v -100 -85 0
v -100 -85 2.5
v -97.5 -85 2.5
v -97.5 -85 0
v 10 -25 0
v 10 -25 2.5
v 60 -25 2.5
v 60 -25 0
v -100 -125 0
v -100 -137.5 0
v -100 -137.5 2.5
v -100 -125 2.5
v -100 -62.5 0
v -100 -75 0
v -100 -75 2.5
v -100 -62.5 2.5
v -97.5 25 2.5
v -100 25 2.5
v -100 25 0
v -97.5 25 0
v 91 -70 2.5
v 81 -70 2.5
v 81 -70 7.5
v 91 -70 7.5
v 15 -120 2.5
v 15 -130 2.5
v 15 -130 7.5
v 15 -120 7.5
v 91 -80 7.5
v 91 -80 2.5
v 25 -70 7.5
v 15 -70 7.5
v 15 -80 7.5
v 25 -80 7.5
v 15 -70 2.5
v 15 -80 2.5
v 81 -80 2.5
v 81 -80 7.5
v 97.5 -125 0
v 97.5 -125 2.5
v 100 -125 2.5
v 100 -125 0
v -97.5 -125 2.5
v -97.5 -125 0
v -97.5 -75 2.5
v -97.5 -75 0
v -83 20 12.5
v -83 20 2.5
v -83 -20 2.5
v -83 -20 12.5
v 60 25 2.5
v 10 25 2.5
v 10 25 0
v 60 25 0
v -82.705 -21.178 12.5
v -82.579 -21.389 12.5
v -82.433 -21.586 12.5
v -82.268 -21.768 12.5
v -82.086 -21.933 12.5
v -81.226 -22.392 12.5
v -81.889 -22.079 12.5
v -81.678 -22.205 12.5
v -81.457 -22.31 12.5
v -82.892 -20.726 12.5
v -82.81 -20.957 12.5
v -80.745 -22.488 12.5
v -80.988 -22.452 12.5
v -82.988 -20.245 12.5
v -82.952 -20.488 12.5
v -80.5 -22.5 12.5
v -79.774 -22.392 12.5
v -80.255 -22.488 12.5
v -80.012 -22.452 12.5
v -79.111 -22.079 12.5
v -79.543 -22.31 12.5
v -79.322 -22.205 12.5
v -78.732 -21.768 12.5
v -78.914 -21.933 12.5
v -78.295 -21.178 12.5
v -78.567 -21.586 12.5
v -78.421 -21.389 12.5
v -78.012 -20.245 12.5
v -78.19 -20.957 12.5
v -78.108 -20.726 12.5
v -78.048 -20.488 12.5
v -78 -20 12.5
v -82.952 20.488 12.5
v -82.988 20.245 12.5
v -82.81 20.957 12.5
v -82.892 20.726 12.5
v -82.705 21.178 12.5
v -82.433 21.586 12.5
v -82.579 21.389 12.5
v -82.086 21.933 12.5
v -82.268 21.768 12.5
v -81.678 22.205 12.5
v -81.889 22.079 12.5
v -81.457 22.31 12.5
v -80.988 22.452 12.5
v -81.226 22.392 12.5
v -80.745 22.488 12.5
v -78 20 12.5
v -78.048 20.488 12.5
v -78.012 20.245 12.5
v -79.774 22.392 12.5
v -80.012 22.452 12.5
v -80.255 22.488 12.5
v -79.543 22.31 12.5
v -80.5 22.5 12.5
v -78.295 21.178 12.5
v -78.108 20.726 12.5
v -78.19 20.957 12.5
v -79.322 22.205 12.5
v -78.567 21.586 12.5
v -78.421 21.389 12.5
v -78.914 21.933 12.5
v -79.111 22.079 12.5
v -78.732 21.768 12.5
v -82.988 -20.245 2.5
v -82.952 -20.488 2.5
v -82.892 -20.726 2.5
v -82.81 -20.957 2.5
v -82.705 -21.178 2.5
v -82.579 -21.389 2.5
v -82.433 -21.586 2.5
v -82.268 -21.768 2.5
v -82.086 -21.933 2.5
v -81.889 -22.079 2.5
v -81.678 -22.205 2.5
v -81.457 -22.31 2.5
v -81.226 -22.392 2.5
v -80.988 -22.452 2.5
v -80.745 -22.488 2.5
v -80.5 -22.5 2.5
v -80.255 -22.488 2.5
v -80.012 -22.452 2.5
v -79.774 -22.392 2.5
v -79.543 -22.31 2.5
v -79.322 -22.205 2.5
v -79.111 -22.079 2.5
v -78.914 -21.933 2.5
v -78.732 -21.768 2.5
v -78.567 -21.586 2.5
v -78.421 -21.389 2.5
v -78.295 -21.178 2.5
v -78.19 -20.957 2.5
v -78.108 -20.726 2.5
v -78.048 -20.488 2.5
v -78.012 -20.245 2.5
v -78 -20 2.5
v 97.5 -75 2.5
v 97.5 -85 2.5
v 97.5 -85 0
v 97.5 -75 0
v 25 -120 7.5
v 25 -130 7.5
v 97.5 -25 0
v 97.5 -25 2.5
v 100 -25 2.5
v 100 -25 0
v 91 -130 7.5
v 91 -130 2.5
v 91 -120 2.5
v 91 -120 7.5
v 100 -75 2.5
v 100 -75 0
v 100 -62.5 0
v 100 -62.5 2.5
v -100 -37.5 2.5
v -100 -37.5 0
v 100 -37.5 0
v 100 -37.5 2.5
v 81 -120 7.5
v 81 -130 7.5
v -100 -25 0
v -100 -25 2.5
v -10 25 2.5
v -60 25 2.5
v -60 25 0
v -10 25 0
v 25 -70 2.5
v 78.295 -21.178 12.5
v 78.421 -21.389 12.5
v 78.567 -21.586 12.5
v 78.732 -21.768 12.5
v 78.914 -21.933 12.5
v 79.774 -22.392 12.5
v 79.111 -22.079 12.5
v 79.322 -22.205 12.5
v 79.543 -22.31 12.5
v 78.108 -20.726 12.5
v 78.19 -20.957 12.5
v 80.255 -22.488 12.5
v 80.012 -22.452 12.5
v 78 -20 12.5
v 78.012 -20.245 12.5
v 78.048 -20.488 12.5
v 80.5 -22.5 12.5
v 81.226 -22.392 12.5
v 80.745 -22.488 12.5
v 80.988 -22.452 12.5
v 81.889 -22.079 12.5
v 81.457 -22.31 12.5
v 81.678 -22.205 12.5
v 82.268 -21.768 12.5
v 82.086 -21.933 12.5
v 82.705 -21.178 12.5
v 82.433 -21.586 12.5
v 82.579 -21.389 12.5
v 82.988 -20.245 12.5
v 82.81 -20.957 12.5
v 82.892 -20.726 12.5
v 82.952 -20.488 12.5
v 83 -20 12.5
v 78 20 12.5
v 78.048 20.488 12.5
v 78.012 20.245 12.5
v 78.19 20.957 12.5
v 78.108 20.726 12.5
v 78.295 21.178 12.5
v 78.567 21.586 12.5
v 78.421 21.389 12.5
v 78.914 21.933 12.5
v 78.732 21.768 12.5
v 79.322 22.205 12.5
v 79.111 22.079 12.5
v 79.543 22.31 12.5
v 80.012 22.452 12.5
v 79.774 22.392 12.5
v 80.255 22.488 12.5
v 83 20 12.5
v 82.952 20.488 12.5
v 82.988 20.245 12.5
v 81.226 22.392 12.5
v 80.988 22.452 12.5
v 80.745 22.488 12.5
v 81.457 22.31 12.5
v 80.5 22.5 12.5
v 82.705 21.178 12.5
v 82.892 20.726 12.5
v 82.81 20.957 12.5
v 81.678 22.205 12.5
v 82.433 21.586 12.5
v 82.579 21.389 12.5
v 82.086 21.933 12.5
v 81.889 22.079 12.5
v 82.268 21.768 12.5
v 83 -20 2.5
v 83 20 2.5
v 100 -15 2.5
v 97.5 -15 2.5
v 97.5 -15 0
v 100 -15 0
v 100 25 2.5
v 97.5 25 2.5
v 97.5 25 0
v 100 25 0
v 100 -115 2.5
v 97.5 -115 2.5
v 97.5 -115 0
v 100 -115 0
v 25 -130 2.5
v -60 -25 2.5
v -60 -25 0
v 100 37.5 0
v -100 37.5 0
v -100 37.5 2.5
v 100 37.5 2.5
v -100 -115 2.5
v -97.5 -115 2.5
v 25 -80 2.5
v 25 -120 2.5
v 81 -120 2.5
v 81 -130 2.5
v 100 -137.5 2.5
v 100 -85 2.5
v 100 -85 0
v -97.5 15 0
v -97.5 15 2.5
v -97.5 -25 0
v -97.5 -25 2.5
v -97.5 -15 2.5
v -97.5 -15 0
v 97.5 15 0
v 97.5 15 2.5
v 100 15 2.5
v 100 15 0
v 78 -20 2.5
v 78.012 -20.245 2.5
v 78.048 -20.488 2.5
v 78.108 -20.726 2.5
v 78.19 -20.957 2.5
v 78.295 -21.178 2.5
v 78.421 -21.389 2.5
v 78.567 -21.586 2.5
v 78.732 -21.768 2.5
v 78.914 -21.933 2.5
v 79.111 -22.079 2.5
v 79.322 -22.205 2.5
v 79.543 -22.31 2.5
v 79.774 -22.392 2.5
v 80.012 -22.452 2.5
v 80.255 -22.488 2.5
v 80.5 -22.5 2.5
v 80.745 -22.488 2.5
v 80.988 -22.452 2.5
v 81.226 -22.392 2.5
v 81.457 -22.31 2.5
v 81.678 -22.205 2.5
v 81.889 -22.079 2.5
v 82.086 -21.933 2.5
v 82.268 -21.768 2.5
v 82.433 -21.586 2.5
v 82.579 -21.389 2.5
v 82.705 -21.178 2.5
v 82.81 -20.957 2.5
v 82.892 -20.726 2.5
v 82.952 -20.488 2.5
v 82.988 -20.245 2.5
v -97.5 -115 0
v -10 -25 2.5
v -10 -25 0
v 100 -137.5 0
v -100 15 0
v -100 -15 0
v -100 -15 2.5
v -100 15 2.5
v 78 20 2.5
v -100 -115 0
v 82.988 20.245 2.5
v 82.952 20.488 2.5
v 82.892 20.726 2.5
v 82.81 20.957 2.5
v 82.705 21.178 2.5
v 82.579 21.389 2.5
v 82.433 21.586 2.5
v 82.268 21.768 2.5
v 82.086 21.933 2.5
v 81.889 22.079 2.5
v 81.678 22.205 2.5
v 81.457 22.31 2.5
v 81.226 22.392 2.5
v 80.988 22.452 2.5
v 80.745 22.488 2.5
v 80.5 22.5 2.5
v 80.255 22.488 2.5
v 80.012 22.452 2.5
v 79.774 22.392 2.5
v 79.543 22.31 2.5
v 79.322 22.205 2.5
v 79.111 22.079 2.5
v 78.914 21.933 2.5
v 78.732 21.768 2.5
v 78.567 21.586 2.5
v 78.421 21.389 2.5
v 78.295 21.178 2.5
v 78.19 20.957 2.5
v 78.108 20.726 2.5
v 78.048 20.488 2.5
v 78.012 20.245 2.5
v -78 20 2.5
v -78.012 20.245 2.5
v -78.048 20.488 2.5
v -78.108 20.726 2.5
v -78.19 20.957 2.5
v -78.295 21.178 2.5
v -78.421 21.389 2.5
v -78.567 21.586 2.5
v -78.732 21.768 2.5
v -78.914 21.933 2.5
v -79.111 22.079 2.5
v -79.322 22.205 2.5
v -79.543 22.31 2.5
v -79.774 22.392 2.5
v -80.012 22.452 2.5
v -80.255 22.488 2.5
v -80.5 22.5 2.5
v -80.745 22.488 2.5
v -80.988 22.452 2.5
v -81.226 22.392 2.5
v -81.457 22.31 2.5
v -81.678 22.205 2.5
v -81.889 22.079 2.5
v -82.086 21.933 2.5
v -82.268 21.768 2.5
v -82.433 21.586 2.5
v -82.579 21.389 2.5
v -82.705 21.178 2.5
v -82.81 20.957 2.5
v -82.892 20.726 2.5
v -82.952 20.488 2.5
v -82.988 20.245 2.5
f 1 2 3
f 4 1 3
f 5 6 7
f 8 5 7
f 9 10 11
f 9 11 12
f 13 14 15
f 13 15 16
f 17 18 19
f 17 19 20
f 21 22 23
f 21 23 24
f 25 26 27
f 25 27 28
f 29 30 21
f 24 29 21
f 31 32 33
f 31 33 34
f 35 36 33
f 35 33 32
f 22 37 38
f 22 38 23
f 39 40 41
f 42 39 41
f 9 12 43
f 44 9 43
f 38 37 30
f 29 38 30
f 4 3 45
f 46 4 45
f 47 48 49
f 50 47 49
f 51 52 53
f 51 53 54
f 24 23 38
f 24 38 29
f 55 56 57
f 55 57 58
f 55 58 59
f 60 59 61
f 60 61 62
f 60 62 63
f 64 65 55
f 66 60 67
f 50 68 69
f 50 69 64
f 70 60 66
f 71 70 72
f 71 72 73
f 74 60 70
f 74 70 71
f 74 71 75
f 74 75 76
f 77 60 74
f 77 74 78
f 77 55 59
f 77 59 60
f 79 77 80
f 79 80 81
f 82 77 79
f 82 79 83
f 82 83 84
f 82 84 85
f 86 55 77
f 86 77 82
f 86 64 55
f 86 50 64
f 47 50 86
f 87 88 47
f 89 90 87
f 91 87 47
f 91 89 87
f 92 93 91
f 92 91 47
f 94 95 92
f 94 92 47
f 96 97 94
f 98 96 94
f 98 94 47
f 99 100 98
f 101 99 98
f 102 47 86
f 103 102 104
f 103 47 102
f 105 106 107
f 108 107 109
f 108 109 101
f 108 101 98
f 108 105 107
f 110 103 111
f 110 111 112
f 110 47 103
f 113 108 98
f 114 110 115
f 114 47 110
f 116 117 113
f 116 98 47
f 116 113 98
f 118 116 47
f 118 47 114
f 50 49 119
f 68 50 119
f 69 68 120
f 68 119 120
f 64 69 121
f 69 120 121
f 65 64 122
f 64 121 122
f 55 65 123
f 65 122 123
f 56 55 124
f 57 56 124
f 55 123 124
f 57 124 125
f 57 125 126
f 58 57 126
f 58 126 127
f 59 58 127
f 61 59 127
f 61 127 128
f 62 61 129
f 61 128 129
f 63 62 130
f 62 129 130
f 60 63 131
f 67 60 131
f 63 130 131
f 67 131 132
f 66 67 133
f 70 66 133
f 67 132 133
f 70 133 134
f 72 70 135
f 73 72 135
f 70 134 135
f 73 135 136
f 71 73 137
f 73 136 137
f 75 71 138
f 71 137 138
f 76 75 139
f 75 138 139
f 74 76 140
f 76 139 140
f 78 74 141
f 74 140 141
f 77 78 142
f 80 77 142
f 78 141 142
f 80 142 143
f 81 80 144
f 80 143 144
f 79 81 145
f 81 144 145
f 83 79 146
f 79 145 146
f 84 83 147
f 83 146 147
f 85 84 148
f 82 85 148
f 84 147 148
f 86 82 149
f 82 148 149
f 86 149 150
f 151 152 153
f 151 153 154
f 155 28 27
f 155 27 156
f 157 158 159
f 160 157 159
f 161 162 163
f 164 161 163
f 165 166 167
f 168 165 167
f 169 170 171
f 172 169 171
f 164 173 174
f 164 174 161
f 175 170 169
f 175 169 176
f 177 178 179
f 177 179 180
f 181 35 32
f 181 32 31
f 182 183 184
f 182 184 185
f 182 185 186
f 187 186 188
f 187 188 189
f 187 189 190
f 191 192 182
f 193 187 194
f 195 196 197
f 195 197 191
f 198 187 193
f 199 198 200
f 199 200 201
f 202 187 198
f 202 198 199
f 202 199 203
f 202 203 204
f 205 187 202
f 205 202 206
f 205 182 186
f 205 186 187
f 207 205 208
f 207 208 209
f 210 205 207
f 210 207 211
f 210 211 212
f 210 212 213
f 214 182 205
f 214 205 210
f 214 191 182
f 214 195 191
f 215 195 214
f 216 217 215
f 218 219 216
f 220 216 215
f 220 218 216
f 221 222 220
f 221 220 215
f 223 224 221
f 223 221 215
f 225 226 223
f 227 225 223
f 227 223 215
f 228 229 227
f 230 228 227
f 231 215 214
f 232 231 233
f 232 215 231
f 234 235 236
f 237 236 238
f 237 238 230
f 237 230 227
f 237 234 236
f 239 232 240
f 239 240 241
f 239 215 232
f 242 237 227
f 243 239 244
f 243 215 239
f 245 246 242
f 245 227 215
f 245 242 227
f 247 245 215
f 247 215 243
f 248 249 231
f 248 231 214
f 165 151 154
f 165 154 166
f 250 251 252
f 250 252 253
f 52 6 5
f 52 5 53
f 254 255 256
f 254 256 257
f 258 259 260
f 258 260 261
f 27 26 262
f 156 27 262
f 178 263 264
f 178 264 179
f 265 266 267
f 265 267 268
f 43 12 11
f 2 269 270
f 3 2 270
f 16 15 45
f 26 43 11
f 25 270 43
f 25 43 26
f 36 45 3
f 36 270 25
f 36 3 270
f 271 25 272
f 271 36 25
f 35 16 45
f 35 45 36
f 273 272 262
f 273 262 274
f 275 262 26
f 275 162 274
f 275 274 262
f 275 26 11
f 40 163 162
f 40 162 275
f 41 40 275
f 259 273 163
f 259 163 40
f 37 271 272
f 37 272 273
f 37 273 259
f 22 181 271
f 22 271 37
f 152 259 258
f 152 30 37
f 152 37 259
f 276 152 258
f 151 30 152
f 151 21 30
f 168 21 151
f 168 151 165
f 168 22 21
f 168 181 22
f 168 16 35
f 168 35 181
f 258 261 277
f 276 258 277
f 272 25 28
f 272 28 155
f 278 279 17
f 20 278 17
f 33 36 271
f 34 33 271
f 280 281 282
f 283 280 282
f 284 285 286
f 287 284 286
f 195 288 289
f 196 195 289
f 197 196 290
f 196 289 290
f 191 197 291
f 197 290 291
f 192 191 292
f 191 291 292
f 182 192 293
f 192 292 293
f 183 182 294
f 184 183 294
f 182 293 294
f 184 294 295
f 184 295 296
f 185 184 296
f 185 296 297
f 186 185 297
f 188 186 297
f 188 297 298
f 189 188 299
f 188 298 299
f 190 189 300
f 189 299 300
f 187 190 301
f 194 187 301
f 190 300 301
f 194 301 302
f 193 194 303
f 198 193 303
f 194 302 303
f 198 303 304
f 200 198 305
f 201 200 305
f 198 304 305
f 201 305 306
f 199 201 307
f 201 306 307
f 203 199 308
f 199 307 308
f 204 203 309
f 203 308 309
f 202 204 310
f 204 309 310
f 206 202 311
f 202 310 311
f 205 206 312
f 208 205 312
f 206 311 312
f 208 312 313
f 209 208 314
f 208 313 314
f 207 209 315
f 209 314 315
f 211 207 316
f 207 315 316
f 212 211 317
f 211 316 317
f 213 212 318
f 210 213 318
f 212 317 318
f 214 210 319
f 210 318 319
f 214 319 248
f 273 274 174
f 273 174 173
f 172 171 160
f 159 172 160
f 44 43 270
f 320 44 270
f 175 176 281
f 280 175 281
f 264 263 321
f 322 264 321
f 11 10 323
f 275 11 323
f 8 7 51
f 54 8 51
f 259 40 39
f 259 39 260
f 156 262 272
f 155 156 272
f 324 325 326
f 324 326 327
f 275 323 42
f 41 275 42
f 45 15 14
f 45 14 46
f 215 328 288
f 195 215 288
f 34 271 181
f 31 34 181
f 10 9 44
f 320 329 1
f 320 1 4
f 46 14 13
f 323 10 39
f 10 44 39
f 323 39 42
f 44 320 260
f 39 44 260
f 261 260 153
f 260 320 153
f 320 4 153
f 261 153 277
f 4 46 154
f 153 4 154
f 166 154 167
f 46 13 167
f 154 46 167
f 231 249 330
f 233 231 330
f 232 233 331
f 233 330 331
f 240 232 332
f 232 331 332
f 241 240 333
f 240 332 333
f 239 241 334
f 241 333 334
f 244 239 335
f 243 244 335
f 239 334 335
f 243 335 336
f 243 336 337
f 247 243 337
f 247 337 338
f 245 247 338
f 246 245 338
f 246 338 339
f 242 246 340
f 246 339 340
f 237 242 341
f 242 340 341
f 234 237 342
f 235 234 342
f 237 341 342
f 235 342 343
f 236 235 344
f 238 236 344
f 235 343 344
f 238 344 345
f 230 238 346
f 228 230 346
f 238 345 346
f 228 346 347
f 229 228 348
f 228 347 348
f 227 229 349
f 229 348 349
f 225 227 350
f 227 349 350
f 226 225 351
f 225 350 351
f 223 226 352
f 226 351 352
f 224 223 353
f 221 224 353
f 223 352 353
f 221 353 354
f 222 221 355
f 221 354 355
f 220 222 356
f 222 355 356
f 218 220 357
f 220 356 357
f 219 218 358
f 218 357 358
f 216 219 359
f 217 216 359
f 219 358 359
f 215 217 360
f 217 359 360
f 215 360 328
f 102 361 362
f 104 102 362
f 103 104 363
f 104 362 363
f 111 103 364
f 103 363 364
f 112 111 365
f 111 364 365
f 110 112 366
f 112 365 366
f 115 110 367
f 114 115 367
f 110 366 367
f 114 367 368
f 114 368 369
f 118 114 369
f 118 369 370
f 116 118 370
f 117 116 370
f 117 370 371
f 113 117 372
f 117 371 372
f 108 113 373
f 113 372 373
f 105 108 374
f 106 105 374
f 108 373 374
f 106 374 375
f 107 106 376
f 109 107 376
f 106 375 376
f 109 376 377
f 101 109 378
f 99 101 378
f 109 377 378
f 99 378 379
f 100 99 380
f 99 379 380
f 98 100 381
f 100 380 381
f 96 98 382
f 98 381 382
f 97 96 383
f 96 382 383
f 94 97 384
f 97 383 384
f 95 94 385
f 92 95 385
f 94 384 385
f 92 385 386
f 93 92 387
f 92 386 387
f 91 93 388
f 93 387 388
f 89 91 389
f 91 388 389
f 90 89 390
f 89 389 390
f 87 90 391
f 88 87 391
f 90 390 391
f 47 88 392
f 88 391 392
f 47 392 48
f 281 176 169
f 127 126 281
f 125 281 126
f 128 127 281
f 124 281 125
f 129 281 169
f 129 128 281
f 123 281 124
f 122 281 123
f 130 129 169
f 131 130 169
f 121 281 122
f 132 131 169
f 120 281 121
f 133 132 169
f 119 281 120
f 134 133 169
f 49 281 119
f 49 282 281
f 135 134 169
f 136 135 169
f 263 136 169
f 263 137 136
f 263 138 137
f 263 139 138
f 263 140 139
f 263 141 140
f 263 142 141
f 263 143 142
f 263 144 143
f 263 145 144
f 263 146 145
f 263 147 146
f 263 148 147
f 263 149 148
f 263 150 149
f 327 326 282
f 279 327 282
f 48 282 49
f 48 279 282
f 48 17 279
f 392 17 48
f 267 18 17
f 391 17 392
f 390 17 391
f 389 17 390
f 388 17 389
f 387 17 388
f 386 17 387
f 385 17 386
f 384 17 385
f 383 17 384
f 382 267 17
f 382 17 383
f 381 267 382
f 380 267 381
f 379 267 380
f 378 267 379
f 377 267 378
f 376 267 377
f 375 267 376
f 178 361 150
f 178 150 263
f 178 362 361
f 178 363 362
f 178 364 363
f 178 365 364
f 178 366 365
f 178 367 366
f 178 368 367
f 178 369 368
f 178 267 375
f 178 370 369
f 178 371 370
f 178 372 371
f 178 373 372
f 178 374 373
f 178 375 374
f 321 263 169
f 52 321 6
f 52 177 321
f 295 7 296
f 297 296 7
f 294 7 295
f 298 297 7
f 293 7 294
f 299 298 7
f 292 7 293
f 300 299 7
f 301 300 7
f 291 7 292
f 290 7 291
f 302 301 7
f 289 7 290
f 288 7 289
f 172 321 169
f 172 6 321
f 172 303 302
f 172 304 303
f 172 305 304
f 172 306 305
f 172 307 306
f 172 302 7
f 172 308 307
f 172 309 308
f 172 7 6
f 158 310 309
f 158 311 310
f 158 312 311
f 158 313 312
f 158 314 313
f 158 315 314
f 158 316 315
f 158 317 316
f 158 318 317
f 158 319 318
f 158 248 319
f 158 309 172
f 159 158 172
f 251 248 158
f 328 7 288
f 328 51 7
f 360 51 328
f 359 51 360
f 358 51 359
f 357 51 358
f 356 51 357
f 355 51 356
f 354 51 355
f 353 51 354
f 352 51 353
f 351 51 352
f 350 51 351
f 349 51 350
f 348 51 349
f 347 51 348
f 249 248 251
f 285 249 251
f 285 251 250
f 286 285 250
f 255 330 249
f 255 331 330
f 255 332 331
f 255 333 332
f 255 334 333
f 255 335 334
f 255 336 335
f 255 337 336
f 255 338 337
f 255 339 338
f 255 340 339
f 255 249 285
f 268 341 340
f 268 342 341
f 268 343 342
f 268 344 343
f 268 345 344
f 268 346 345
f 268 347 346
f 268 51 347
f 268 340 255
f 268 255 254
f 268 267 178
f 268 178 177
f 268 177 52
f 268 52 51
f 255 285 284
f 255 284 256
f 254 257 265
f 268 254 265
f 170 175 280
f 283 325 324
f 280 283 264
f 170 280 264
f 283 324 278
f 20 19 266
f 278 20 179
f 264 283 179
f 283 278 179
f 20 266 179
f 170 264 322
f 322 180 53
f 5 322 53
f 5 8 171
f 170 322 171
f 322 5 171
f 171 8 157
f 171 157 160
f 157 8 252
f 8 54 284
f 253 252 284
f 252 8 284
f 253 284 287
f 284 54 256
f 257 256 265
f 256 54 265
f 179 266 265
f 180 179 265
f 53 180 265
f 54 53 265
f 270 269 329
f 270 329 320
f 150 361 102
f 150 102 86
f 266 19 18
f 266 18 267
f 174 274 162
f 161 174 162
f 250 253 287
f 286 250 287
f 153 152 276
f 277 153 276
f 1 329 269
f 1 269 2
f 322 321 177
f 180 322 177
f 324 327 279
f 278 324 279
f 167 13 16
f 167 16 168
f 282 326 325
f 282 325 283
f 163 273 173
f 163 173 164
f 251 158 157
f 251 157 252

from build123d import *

# Parameters (mm, degrees)
SKETCH_W        = 200
SKETCH_H        = 75
PAD_DEPTH       = 2.5
PAD001_DEPTH    = 10
SKETCH002_W     = 50
SKETCH002_H     = 50
SKETCH002_W_2   = 2.5
SKETCH002_H_2   = 10
POCKET_DEPTH    = 5
SKETCH003_W     = 200
SKETCH003_H     = 75
PAD002_DEPTH    = 2.5
SKETCH004_W     = 2.5
SKETCH004_H     = 10
POCKET001_DEPTH = 2.5
SKETCH005_W     = 10
SKETCH005_H     = 10
PAD003_DEPTH    = 5


with BuildPart() as base_inverted:
    # Sketch (on XY_Plane of Origin) → Pad (new body)
    with BuildSketch(Plane.XY):
        Rectangle(SKETCH_W, SKETCH_H)
    extrude(amount=PAD_DEPTH)

    # Sketch001 (on Face6 of Pad) → Pad001 (join)
    with BuildSketch(Plane.XY.offset(2.5)):
        with BuildLine():
            ThreePointArc((-78, 20), (-80.5, 22.5), (-83, 20))
            Line((-83, 20), (-83, -20))
            ThreePointArc((-83, -20), (-80.5, -22.5), (-78, -20))
            Line((-78, 20), (-78, -20))
        make_face()
        with BuildLine():
            ThreePointArc((83, 20), (80.5, 22.5), (78, 20))
            Line((78, 20), (78, -20))
            ThreePointArc((78, -20), (80.5, -22.5), (83, -20))
            Line((83, 20), (83, -20))
        make_face()
    extrude(amount=PAD001_DEPTH)

    # Sketch002 (on Face5 of Pad001) → Pocket (cut)
    with BuildSketch(Plane.XY.offset(2.5)):
        with Locations((-35, 0)):
            Rectangle(SKETCH002_W, SKETCH002_H)
        with Locations((35, 0)):
            Rectangle(SKETCH002_W, SKETCH002_H)
        with Locations((-98.75, 20)):
            Rectangle(SKETCH002_W_2, SKETCH002_H_2)
        with Locations((-98.75, -20)):
            Rectangle(SKETCH002_W_2, SKETCH002_H_2)
        with Locations((98.75, -20)):
            Rectangle(SKETCH002_W_2, SKETCH002_H_2)
        with Locations((98.75, 20)):
            Rectangle(SKETCH002_W_2, SKETCH002_H_2)
    extrude(amount=-POCKET_DEPTH, mode=Mode.SUBTRACT)


with BuildPart() as upper:
    # Sketch003 (on XY_Plane001 of Origin002) → Pad002 (new body)
    with BuildSketch(Plane.XY):
        with Locations((0, -100)):
            Rectangle(SKETCH003_W, SKETCH003_H)
    extrude(amount=PAD002_DEPTH)

    # Sketch004 (on Face6 of Pad002) → Pocket001 (cut)
    with BuildSketch(Plane.XY.offset(2.5)):
        with Locations((-98.75, -80)):
            Rectangle(SKETCH004_W, SKETCH004_H)
        with Locations((-98.75, -120)):
            Rectangle(SKETCH004_W, SKETCH004_H)
        with Locations((98.75, -120)):
            Rectangle(SKETCH004_W, SKETCH004_H)
        with Locations((98.75, -80)):
            Rectangle(SKETCH004_W, SKETCH004_H)
    extrude(amount=-POCKET001_DEPTH, mode=Mode.SUBTRACT)

    # Sketch005 (on Face4 of Pocket001) → Pad003 (join)
    with BuildSketch(Plane.XY.offset(2.5)):
        with Locations((20, -75)):
            Rectangle(SKETCH005_W, SKETCH005_H)
        with Locations((20, -125)):
            Rectangle(SKETCH005_W, SKETCH005_H)
        with Locations((86, -75)):
            Rectangle(SKETCH005_W, SKETCH005_H)
        with Locations((86, -125)):
            Rectangle(SKETCH005_W, SKETCH005_H)
    extrude(amount=PAD003_DEPTH)


solid = Compound([base_inverted.part, upper.part])
